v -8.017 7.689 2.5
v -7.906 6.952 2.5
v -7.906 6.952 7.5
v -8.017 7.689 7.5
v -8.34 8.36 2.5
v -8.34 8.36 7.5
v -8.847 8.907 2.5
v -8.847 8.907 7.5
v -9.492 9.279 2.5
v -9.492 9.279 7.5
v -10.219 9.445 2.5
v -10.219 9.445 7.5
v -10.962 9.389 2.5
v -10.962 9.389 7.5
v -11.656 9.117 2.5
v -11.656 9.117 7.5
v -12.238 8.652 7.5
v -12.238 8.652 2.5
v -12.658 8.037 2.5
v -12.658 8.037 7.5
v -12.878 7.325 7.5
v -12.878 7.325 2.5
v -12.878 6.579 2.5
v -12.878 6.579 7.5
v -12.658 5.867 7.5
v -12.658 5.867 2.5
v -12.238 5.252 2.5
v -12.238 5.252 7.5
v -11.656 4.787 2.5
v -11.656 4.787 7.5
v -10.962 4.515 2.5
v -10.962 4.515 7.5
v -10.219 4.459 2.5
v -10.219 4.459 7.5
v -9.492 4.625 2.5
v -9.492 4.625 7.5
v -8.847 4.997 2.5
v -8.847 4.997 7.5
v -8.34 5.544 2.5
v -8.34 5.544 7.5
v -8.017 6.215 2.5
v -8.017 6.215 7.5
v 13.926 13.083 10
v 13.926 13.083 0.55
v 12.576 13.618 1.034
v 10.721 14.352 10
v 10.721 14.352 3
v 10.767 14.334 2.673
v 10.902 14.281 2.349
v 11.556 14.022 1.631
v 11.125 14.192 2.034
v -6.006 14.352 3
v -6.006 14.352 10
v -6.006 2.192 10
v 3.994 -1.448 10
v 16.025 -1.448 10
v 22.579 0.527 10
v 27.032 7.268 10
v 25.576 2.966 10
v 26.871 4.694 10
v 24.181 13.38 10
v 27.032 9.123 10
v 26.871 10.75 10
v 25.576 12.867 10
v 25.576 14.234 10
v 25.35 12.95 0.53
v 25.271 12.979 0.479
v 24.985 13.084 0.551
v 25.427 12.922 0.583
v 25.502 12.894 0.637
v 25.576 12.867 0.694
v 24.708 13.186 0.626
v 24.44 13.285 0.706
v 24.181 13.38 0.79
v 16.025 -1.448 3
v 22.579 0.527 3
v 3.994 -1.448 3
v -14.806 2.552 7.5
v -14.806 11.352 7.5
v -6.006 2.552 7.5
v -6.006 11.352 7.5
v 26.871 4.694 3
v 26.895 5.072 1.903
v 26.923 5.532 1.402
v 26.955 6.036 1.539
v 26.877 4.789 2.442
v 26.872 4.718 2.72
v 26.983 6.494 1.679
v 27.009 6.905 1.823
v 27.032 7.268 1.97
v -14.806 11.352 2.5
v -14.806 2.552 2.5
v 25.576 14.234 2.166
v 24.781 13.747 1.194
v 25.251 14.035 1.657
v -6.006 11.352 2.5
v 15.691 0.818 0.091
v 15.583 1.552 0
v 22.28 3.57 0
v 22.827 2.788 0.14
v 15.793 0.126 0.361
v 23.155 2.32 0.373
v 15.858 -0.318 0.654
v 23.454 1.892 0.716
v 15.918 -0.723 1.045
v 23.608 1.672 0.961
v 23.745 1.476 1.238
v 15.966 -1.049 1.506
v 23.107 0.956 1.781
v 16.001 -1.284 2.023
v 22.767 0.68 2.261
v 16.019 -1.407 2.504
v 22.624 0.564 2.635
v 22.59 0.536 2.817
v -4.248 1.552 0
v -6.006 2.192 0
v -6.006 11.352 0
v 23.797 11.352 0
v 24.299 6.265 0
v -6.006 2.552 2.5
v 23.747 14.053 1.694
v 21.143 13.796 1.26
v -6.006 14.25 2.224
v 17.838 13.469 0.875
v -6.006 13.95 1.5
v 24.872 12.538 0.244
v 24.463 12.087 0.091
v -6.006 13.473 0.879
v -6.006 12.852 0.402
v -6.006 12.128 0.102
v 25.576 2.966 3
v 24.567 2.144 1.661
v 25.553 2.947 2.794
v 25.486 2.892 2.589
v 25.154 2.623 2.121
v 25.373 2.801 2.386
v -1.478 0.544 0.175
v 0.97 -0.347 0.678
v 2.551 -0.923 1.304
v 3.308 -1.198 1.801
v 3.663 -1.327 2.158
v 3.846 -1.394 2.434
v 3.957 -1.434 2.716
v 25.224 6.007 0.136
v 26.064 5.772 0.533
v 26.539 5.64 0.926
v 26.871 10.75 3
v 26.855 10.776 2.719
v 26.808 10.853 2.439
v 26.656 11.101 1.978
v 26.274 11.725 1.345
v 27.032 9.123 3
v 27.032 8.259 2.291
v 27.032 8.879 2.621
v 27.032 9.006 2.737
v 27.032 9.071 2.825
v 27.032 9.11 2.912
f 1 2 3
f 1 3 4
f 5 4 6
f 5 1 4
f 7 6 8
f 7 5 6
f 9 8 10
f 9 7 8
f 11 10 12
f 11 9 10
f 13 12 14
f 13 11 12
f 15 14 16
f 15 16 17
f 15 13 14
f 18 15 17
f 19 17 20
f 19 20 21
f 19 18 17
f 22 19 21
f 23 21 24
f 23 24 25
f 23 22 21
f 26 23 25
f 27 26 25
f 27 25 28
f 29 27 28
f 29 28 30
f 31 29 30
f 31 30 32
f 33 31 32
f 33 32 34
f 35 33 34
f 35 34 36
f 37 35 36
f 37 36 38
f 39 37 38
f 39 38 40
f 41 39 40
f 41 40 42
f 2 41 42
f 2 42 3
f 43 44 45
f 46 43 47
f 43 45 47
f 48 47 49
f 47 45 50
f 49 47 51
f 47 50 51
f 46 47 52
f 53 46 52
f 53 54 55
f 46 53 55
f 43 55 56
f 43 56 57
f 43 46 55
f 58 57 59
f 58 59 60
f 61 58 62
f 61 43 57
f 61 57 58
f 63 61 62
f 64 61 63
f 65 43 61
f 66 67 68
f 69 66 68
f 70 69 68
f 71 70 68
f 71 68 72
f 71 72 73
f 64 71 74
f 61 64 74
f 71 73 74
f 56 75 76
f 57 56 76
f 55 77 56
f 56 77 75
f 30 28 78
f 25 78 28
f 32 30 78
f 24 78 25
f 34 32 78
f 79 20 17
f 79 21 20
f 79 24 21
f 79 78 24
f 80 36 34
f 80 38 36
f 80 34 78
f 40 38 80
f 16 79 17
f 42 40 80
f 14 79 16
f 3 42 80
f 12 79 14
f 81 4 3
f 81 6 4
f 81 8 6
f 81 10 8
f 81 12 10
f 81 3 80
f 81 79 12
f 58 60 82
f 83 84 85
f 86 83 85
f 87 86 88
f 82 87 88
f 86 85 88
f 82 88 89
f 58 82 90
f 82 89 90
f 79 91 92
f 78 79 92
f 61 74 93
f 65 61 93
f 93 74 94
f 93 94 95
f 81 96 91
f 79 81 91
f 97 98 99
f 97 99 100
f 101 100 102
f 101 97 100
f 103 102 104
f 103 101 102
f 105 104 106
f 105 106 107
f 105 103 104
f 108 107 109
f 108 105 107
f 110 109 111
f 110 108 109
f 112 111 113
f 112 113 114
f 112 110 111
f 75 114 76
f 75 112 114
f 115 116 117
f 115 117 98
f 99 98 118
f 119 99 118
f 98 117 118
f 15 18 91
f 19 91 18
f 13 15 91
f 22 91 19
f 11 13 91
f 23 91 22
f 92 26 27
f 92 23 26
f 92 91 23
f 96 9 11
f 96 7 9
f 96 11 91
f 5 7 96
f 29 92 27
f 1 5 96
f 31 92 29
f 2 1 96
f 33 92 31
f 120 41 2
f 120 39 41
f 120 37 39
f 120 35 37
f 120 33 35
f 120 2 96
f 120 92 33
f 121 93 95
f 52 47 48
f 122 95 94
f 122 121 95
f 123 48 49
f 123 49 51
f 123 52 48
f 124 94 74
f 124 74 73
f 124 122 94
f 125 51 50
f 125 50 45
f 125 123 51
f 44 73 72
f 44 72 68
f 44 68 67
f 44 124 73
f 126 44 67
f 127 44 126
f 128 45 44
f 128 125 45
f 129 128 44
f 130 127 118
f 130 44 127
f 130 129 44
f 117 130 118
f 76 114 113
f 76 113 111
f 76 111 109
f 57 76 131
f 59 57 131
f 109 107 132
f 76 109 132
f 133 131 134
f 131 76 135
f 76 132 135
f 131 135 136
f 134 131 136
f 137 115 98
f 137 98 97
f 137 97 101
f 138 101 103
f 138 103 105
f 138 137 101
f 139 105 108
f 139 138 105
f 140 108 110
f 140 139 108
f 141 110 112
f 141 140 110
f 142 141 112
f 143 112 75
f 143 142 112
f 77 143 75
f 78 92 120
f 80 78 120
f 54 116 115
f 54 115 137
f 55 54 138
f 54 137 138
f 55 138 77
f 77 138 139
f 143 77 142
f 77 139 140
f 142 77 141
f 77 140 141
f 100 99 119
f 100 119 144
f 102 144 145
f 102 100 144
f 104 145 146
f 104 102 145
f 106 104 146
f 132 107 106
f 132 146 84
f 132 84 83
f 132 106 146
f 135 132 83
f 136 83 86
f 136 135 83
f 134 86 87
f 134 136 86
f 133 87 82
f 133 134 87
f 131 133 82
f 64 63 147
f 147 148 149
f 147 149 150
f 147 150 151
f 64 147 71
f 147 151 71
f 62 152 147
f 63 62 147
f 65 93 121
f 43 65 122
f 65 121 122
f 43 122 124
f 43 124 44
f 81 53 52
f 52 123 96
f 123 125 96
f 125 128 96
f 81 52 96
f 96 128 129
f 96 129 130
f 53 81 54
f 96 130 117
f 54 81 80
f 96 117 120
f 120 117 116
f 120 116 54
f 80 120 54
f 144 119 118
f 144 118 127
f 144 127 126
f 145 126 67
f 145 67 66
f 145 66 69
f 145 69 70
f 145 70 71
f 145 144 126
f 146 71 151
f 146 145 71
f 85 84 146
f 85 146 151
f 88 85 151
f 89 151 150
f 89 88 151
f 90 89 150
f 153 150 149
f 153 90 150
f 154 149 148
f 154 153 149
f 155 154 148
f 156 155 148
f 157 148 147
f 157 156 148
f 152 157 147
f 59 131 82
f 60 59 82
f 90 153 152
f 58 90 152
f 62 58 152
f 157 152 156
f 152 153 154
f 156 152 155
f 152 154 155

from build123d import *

# Parameters (mm, degrees)
F0_R        = 2.5
F1_DEPTH    = 10
F2_W        = 8.8
F2_H        = 8.8
F2_R        = 2.5
F3_DEPTH    = 2.5
F4_W        = 8.8
F4_H        = 8.8
F4_R        = 2.5
F5_DEPTH    = 2.5
F6_T1_DEPTH = 52.7272001401
F6_T3_DEPTH = 37.6344553761
F6_T5_DEPTH = 42.8447953281
F6_T7_DEPTH = 58.0308217405
F6_T9_DEPTH = 38.1595084339
F7_T1_DEPTH = 58.883894651


# Not quite as in the source:
# - a fillet or chamfer that OpenCascade refuses, or shapes differently, is made with other operations: its cross-section is extruded or revolved along the edge and cut away or added


with BuildPart() as f1:
    # F0 (on Top) → F1 (new body)
    with BuildSketch(Plane.XY):
        Polygon((10.7213496009, 14.3520427298), (0, 14.3520427298), (-6.0058505391, 14.3520427298), (-6.0058505391, 11.3520427298), (-14.8058505391, 11.3520427298), (-14.8058505391, 2.5520427298), (-6.0058505391, 2.5520427298), (-6.0058505391, -1.4479572702), (0, -1.4479572702), (16.0249712014, -1.4479572702), (22.5786776848, 0.5269235903), (25.5761091025, 2.9657761595), (26.8709543148, 4.6940274585), (27.0316003021, 7.267983998), (27.0316003021, 9.1232445721), (26.8709543148, 10.7497860696), (25.5761091025, 12.8667177236), (24.1809434093, 13.3803505253), (25.5761091025, 14.2337194165), (13.9262006316, 13.0831117922), align=None)
        with Locations((-10.4058505391, 6.9520427298)):
            Circle(F0_R, mode=Mode.SUBTRACT)
    extrude(amount=F1_DEPTH)

    # F2 (on face) → F3 (cut)
    with BuildSketch(Plane.XY.offset(10)):
        with Locations((-10.4058505391, 6.9520427298)):
            Rectangle(F2_W, F2_H)
        with Locations((-10.4058505391, 6.9520427298)):
            Circle(F2_R, mode=Mode.SUBTRACT)
    extrude(amount=-F3_DEPTH, mode=Mode.SUBTRACT)

    # F4 (on face) → F5 (cut)
    with BuildSketch(Plane(origin=(0, 0, 0), x_dir=(1, 0, 0), z_dir=(0, 0, -1))):
        with Locations((-10.4058505391, -6.9520427298)):
            Rectangle(F4_W, F4_H)
        with Locations((-10.4058505391, -6.9520427298)):
            Circle(F4_R, mode=Mode.SUBTRACT)
    extrude(amount=-F5_DEPTH, mode=Mode.SUBTRACT)

    # F6: fillet of radius 3 on 5 edges, made by hand

    # F6_s2 → F6_t1 (cut)
    with BuildSketch(Plane.YZ.offset(-24.0058505391)):
        with BuildLine():
            ThreePointArc((14.3520427298, 3), (13.4733630734, 0.8786796564), (11.3520427298, 0))
            Line((11.3520427298, 0), (11.3520427298, -0.06))
            Line((11.3520427298, -0.06), (14.4120427298, -0.06))
            Line((14.4120427298, -0.06), (14.4120427298, 3))
            Line((14.4120427298, 3), (14.3520427298, 3))
        make_face()
    extrude(amount=F6_T1_DEPTH, mode=Mode.SUBTRACT)

    # F6_s4 → F6_t3 (cut)
    with BuildSketch(Plane(origin=(1.1379480439, -11.5217301503, 0), x_dir=(0, 0, 1), z_dir=(-0.0982871663, 0.9951580944, 0))):
        with BuildLine():
            ThreePointArc((0, 24.7974137027), (0.8786796564, 26.9187340462), (3, 27.7974137027))
            Line((3, 27.7974137027), (3, 27.8574137027))
            Line((3, 27.8574137027), (-0.06, 27.8574137027))
            Line((-0.06, 27.8574137027), (-0.06, 24.7974137027))
            Line((-0.06, 24.7974137027), (0, 24.7974137027))
        make_face()
    extrude(amount=F6_T3_DEPTH, mode=Mode.SUBTRACT)

    # F6_s6 → F6_t5 (cut)
    with BuildSketch(Plane(origin=(-2.9435517348, -0.8870040179, 0), x_dir=(0, 0, 1), z_dir=(0.9574729658, 0.2885229968, 0))):
        with BuildLine():
            ThreePointArc((0, 3.0099526564), (0.8786796564, 5.131273), (3, 6.0099526564))
            Line((3, 6.0099526564), (3, 6.0699526564))
            Line((3, 6.0699526564), (-0.06, 6.0699526564))
            Line((-0.06, 6.0699526564), (-0.06, 3.0099526564))
            Line((-0.06, 3.0099526564), (0, 3.0099526564))
        make_face()
    extrude(amount=F6_T5_DEPTH, mode=Mode.SUBTRACT)

    # F6_s8 → F6_t7 (cut)
    with BuildSketch(Plane.YZ.offset(-24.0058505391)):
        with BuildLine():
            ThreePointArc((1.5520427298, 0), (-0.5692776137, 0.8786796564), (-1.4479572702, 3))
            Line((-1.4479572702, 3), (-1.5079572702, 3))
            Line((-1.5079572702, 3), (-1.5079572702, -0.06))
            Line((-1.5079572702, -0.06), (1.5520427298, -0.06))
            Line((1.5520427298, -0.06), (1.5520427298, 0))
        make_face()
    extrude(amount=F6_T7_DEPTH, mode=Mode.SUBTRACT)

    # F6_s10 → F6_t9 (cut)
    with BuildSketch(Plane(origin=(-0.1744913342, -0.2328964668, 0), x_dir=(0, 0, 1), z_dir=(0.5996018316, 0.8002984715, 0))):
        with BuildLine():
            ThreePointArc((0, 15.6902362056), (0.8786796564, 17.8115565491), (3, 18.6902362056))
            Line((3, 18.6902362056), (3, 18.7502362056))
            Line((3, 18.7502362056), (-0.06, 18.7502362056))
            Line((-0.06, 18.7502362056), (-0.06, 15.6902362056))
            Line((-0.06, 15.6902362056), (0, 15.6902362056))
        make_face()
    extrude(amount=F6_T9_DEPTH, mode=Mode.SUBTRACT)

    # F7: chamfer of 10 x 3.6397023427 on 1 edges, made by hand

    # F7_s2 → F7_t1 (cut)
    with BuildSketch(Plane.XY.offset(-22.9419473255)):
        Polygon((-6.0058505391, 2.1917450725), (3.9941494609, -1.4479572702), (-6.0058505391, -1.4479572702), align=None)
    extrude(amount=F7_T1_DEPTH, mode=Mode.SUBTRACT)


solid = f1.part
